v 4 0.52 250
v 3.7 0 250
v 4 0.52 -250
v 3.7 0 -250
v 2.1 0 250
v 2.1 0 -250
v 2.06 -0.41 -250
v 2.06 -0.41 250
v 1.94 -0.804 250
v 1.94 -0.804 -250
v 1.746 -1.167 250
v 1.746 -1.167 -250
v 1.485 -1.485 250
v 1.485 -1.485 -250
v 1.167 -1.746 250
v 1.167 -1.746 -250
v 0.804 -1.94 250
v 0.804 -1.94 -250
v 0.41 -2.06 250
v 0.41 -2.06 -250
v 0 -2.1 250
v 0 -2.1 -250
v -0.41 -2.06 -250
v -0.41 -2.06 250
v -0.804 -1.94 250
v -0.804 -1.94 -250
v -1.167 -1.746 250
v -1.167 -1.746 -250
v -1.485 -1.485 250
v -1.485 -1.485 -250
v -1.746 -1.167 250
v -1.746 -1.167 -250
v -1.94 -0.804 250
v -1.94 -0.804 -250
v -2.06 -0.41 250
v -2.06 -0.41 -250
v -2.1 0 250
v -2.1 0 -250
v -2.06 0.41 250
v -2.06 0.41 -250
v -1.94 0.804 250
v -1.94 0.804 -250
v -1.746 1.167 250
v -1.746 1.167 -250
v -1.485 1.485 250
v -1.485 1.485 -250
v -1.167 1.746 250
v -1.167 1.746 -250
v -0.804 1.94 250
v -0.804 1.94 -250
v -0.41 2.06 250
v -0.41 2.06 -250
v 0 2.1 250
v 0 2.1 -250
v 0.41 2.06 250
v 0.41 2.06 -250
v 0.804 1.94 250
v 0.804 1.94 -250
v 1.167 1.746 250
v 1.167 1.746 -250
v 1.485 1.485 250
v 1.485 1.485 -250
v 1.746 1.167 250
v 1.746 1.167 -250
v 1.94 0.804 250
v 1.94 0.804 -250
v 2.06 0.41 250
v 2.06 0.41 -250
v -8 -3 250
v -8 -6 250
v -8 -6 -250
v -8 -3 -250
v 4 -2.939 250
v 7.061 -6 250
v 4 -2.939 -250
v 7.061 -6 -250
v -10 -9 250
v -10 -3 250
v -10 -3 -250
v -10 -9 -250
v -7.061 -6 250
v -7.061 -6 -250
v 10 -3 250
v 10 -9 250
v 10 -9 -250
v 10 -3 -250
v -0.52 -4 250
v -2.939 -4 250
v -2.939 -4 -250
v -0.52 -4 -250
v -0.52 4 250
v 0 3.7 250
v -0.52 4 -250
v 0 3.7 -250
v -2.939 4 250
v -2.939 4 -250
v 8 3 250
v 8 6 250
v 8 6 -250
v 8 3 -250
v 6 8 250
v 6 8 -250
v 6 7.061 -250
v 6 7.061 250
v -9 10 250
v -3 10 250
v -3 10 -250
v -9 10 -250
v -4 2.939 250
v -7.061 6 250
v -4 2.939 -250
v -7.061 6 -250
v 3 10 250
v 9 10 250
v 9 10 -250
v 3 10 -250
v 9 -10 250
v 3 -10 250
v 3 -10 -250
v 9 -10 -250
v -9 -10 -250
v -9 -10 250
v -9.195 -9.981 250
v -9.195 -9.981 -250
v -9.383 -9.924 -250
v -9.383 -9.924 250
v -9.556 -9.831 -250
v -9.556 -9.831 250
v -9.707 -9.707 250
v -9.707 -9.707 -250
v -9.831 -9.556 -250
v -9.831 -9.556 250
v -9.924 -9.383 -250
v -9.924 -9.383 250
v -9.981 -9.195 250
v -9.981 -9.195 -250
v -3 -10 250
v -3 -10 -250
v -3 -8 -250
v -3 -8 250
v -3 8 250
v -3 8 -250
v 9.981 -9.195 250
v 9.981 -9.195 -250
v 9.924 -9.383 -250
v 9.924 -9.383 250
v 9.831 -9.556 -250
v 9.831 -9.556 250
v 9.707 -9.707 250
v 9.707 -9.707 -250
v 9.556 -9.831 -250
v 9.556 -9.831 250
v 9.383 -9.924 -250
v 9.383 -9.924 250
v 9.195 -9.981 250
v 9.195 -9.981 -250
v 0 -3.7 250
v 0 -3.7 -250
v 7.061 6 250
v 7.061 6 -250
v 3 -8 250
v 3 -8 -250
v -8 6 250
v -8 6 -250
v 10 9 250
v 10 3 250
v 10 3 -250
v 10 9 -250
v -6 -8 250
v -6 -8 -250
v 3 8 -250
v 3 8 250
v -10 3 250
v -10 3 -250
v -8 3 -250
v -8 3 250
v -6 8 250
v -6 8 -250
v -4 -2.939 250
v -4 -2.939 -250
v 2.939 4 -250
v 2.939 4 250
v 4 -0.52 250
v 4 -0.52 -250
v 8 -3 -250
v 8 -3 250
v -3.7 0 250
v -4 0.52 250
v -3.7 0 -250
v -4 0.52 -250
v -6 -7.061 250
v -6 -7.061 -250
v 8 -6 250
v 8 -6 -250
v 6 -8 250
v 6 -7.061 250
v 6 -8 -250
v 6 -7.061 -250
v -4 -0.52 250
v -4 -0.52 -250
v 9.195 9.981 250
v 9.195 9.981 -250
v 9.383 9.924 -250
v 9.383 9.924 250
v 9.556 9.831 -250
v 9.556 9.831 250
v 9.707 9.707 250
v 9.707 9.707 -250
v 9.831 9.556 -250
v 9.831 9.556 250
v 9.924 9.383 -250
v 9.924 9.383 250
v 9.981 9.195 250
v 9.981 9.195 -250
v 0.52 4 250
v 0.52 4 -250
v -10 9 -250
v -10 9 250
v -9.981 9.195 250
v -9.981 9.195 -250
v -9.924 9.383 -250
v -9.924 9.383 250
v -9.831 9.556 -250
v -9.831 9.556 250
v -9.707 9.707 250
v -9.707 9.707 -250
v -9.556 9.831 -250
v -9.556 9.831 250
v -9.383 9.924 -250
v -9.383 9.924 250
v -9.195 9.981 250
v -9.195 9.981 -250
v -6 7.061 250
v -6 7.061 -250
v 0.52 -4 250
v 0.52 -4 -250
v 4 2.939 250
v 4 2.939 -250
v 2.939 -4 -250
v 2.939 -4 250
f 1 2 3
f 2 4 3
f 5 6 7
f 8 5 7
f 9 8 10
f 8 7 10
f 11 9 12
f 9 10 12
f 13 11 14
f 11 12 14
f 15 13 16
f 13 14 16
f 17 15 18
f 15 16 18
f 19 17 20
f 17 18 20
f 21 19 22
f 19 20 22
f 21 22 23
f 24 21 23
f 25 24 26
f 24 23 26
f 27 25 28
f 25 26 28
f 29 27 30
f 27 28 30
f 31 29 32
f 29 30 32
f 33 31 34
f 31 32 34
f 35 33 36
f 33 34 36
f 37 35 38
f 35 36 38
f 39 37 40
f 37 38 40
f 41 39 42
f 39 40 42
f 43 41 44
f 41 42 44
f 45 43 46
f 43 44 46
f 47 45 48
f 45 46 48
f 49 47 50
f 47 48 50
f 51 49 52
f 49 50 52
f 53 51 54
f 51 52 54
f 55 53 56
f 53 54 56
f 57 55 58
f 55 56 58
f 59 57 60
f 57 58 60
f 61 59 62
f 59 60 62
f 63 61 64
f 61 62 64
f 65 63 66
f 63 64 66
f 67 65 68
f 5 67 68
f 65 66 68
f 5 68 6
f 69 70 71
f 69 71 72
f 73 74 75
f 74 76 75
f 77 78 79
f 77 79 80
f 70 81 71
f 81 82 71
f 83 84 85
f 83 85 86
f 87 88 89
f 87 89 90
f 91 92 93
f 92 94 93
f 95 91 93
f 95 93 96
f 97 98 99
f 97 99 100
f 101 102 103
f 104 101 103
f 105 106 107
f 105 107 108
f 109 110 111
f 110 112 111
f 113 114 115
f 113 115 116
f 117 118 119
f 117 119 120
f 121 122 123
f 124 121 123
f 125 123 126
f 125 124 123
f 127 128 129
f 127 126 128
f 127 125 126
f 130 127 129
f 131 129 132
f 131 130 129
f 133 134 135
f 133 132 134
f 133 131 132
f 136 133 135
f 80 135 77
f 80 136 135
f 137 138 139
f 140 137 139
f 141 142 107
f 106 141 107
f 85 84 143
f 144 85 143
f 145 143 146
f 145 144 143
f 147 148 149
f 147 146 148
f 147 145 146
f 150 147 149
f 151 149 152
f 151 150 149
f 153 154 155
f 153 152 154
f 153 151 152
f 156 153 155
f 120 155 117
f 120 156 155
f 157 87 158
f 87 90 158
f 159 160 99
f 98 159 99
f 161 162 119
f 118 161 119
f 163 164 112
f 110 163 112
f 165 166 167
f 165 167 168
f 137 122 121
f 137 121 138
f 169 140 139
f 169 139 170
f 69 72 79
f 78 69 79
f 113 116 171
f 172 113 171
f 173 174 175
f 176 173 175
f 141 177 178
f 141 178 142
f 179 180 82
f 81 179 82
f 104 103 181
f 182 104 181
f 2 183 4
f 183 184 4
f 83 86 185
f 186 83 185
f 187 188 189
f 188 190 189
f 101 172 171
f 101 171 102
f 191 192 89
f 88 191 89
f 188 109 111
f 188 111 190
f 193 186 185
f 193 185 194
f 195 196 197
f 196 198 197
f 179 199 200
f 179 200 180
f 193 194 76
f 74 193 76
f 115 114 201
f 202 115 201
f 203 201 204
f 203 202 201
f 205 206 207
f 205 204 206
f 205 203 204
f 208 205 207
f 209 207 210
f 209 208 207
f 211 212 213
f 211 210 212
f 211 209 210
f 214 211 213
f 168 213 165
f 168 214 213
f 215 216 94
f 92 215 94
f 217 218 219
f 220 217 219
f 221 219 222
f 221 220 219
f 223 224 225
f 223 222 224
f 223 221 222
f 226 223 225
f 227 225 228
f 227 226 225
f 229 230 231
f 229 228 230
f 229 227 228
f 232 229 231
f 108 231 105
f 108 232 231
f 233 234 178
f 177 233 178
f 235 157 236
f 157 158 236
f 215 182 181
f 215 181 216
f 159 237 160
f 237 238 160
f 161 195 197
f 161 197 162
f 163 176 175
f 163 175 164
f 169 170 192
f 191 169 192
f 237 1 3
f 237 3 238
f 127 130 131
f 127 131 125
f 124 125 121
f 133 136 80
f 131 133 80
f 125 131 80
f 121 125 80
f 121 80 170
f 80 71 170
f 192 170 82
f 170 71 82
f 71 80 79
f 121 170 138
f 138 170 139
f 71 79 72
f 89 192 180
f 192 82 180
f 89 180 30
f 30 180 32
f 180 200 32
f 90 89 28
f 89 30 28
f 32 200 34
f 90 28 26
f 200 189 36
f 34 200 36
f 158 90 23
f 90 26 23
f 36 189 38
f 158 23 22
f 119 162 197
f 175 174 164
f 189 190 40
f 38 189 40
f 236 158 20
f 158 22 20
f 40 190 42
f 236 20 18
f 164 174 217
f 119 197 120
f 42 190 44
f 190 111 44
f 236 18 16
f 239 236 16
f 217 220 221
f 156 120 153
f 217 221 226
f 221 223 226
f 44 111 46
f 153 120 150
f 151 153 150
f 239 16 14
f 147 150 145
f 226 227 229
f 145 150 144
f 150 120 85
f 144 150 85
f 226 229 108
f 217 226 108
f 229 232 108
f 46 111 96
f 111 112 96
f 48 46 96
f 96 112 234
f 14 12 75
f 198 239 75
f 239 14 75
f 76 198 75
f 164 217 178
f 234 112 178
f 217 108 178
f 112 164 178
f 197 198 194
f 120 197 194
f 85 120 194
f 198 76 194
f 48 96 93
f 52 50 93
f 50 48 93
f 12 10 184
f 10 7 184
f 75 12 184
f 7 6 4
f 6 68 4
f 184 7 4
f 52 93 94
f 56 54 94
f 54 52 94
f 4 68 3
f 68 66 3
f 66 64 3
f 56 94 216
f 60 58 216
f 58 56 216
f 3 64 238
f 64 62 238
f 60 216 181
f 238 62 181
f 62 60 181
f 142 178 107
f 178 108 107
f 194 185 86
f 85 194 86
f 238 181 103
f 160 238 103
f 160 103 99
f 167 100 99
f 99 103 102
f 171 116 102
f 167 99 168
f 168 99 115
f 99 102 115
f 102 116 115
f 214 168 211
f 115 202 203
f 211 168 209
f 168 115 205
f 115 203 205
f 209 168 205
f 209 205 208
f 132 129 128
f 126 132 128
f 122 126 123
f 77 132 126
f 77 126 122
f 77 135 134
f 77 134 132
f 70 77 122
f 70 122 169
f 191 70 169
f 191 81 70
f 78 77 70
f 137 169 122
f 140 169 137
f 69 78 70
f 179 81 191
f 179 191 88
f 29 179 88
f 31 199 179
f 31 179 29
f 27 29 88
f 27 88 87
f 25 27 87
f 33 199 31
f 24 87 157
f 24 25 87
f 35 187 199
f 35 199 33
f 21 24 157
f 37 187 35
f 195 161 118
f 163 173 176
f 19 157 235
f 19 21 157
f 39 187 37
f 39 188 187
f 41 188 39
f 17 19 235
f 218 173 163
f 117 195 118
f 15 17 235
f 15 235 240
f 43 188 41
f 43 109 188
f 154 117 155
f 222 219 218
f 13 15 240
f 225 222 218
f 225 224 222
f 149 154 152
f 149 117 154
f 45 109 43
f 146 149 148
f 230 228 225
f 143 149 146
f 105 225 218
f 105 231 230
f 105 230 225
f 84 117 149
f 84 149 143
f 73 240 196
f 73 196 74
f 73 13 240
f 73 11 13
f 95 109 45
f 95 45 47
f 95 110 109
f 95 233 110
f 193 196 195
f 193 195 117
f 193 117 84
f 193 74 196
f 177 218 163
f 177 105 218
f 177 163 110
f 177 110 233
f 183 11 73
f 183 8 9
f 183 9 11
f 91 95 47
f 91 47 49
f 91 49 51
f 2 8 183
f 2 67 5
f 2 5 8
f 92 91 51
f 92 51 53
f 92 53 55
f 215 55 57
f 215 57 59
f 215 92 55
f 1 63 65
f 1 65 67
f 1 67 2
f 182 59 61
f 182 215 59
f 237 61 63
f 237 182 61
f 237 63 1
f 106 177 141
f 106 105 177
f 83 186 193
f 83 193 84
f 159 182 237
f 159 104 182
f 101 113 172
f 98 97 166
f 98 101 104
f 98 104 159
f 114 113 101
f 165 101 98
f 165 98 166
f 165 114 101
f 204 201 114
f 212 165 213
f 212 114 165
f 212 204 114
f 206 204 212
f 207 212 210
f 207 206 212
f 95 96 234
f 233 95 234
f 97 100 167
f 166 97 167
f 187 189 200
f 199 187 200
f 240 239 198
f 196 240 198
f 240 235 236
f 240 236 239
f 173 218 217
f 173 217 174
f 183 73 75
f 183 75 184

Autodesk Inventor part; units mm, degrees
ref_plane "YZ Plane" through (0, 0, 0) normal (1, 0, 0) x (0, 1, 0)
ref_plane "XZ Plane" through (0, 0, 0) normal (0, 1, 0) x (-1, 0, 0)
ref_plane "XY Plane" through (0, 0, 0) normal (0, 0, 1) x (1, 0, 0)
sketch "Sketch1" plane through (0, 0, 0) normal (0, 0, 1) x (1, 0, 0)
  line L0 (-2.205, 0) -> (2.205, 0)
  line L1 (0, -2.205) -> (0, 2.205)
  arc A0 (9, -10) -> (10, -9) centre (9, -9) ccw
  line L2 (-10, 9) -> (-10, 3)
  line L3 (-10, 3) -> (-8, 3)
  line L4 (-8, 3) -> (-8, 6)
  line L5 (-8, 6) -> (-7.0607, 6)
  line L6 (-7.0607, 6) -> (-4, 2.9393)
  line L7 (-4, 2.9393) -> (-4, 0.5196)
  line L8 (-4, 0.5196) -> (-3.7, 0)
  line L9 (-3.7, 0) -> (-4, -0.5196)
  line L10 (-4, -0.5196) -> (-4, -2.9393)
  line L11 (-4, -2.9393) -> (-7.0607, -6)
  line L12 (-7.0607, -6) -> (-8, -6)
  line L13 (-8, -6) -> (-8, -3)
  line L14 (-8, -3) -> (-10, -3)
  line L15 (-10, -3) -> (-10, -9)
  arc A1 (-10, -9) -> (-9, -10) centre (-9, -9) ccw
  line L16 (-9, -10) -> (-3, -10)
  line L17 (-3, -10) -> (-3, -8)
  line L18 (-3, -8) -> (-6, -8)
  line L19 (-6, -7.0607) -> (-2.9393, -4)
  line L20 (-2.9393, -4) -> (-0.5196, -4)
  line L21 (-0.5196, -4) -> (0, -3.7)
  line L22 (0, -3.7) -> (0.5196, -4)
  line L23 (0.5196, -4) -> (2.9393, -4)
  line L24 (2.9393, -4) -> (6, -7.0607)
  line L25 (6, -7.0607) -> (6, -8)
  line L26 (6, -8) -> (3, -8)
  line L27 (3, -8) -> (3, -10)
  line L28 (3, -10) -> (9, -10)
  line L29 (10, -9) -> (10, -3)
  line L30 (10, -3) -> (8, -3)
  line L31 (8, -3) -> (8, -6)
  line L32 (8, -6) -> (7.0607, -6)
  line L33 (7.0607, -6) -> (4, -2.9393)
  line L34 (4, -2.9393) -> (4, -0.5196)
  line L35 (4, -0.5196) -> (3.7, 0)
  line L36 (3.7, 0) -> (4, 0.5196)
  line L37 (4, 0.5196) -> (4, 2.9393)
  line L38 (4, 2.9393) -> (7.0607, 6)
  line L39 (7.0607, 6) -> (8, 6)
  line L40 (8, 6) -> (8, 3)
  line L41 (8, 3) -> (10, 3)
  line L42 (10, 3) -> (10, 9)
  arc A2 (10, 9) -> (9, 10) centre (9, 9) ccw
  line L43 (9, 10) -> (3, 10)
  line L44 (3, 10) -> (3, 8)
  line L45 (3, 8) -> (6, 8)
  line L46 (6, 8) -> (6, 7.0607)
  line L47 (6, 7.0607) -> (2.9393, 4)
  line L48 (2.9393, 4) -> (0.5196, 4)
  line L49 (0.5196, 4) -> (0, 3.7)
  line L50 (0, 3.7) -> (-0.5196, 4)
  line L51 (-0.5196, 4) -> (-2.9393, 4)
  line L52 (-2.9393, 4) -> (-6, 7.0607)
  line L53 (-6, 7.0607) -> (-6, 8)
  line L54 (-6, 8) -> (-3, 8)
  line L55 (-3, 8) -> (-3, 10)
  line L56 (-3, 10) -> (-9, 10)
  arc A3 (-9, 10) -> (-10, 9) centre (-9, 9) ccw
  circle A4 centre (0, 0) radius 2.1
  line L57 (-6, -8) -> (-6, -7.0607)
extrude "Extrusion1" add sketch "Sketch1" along normal mid plane 500
properties part number "HFS5-2020-450" material "Aluminum 6061"
